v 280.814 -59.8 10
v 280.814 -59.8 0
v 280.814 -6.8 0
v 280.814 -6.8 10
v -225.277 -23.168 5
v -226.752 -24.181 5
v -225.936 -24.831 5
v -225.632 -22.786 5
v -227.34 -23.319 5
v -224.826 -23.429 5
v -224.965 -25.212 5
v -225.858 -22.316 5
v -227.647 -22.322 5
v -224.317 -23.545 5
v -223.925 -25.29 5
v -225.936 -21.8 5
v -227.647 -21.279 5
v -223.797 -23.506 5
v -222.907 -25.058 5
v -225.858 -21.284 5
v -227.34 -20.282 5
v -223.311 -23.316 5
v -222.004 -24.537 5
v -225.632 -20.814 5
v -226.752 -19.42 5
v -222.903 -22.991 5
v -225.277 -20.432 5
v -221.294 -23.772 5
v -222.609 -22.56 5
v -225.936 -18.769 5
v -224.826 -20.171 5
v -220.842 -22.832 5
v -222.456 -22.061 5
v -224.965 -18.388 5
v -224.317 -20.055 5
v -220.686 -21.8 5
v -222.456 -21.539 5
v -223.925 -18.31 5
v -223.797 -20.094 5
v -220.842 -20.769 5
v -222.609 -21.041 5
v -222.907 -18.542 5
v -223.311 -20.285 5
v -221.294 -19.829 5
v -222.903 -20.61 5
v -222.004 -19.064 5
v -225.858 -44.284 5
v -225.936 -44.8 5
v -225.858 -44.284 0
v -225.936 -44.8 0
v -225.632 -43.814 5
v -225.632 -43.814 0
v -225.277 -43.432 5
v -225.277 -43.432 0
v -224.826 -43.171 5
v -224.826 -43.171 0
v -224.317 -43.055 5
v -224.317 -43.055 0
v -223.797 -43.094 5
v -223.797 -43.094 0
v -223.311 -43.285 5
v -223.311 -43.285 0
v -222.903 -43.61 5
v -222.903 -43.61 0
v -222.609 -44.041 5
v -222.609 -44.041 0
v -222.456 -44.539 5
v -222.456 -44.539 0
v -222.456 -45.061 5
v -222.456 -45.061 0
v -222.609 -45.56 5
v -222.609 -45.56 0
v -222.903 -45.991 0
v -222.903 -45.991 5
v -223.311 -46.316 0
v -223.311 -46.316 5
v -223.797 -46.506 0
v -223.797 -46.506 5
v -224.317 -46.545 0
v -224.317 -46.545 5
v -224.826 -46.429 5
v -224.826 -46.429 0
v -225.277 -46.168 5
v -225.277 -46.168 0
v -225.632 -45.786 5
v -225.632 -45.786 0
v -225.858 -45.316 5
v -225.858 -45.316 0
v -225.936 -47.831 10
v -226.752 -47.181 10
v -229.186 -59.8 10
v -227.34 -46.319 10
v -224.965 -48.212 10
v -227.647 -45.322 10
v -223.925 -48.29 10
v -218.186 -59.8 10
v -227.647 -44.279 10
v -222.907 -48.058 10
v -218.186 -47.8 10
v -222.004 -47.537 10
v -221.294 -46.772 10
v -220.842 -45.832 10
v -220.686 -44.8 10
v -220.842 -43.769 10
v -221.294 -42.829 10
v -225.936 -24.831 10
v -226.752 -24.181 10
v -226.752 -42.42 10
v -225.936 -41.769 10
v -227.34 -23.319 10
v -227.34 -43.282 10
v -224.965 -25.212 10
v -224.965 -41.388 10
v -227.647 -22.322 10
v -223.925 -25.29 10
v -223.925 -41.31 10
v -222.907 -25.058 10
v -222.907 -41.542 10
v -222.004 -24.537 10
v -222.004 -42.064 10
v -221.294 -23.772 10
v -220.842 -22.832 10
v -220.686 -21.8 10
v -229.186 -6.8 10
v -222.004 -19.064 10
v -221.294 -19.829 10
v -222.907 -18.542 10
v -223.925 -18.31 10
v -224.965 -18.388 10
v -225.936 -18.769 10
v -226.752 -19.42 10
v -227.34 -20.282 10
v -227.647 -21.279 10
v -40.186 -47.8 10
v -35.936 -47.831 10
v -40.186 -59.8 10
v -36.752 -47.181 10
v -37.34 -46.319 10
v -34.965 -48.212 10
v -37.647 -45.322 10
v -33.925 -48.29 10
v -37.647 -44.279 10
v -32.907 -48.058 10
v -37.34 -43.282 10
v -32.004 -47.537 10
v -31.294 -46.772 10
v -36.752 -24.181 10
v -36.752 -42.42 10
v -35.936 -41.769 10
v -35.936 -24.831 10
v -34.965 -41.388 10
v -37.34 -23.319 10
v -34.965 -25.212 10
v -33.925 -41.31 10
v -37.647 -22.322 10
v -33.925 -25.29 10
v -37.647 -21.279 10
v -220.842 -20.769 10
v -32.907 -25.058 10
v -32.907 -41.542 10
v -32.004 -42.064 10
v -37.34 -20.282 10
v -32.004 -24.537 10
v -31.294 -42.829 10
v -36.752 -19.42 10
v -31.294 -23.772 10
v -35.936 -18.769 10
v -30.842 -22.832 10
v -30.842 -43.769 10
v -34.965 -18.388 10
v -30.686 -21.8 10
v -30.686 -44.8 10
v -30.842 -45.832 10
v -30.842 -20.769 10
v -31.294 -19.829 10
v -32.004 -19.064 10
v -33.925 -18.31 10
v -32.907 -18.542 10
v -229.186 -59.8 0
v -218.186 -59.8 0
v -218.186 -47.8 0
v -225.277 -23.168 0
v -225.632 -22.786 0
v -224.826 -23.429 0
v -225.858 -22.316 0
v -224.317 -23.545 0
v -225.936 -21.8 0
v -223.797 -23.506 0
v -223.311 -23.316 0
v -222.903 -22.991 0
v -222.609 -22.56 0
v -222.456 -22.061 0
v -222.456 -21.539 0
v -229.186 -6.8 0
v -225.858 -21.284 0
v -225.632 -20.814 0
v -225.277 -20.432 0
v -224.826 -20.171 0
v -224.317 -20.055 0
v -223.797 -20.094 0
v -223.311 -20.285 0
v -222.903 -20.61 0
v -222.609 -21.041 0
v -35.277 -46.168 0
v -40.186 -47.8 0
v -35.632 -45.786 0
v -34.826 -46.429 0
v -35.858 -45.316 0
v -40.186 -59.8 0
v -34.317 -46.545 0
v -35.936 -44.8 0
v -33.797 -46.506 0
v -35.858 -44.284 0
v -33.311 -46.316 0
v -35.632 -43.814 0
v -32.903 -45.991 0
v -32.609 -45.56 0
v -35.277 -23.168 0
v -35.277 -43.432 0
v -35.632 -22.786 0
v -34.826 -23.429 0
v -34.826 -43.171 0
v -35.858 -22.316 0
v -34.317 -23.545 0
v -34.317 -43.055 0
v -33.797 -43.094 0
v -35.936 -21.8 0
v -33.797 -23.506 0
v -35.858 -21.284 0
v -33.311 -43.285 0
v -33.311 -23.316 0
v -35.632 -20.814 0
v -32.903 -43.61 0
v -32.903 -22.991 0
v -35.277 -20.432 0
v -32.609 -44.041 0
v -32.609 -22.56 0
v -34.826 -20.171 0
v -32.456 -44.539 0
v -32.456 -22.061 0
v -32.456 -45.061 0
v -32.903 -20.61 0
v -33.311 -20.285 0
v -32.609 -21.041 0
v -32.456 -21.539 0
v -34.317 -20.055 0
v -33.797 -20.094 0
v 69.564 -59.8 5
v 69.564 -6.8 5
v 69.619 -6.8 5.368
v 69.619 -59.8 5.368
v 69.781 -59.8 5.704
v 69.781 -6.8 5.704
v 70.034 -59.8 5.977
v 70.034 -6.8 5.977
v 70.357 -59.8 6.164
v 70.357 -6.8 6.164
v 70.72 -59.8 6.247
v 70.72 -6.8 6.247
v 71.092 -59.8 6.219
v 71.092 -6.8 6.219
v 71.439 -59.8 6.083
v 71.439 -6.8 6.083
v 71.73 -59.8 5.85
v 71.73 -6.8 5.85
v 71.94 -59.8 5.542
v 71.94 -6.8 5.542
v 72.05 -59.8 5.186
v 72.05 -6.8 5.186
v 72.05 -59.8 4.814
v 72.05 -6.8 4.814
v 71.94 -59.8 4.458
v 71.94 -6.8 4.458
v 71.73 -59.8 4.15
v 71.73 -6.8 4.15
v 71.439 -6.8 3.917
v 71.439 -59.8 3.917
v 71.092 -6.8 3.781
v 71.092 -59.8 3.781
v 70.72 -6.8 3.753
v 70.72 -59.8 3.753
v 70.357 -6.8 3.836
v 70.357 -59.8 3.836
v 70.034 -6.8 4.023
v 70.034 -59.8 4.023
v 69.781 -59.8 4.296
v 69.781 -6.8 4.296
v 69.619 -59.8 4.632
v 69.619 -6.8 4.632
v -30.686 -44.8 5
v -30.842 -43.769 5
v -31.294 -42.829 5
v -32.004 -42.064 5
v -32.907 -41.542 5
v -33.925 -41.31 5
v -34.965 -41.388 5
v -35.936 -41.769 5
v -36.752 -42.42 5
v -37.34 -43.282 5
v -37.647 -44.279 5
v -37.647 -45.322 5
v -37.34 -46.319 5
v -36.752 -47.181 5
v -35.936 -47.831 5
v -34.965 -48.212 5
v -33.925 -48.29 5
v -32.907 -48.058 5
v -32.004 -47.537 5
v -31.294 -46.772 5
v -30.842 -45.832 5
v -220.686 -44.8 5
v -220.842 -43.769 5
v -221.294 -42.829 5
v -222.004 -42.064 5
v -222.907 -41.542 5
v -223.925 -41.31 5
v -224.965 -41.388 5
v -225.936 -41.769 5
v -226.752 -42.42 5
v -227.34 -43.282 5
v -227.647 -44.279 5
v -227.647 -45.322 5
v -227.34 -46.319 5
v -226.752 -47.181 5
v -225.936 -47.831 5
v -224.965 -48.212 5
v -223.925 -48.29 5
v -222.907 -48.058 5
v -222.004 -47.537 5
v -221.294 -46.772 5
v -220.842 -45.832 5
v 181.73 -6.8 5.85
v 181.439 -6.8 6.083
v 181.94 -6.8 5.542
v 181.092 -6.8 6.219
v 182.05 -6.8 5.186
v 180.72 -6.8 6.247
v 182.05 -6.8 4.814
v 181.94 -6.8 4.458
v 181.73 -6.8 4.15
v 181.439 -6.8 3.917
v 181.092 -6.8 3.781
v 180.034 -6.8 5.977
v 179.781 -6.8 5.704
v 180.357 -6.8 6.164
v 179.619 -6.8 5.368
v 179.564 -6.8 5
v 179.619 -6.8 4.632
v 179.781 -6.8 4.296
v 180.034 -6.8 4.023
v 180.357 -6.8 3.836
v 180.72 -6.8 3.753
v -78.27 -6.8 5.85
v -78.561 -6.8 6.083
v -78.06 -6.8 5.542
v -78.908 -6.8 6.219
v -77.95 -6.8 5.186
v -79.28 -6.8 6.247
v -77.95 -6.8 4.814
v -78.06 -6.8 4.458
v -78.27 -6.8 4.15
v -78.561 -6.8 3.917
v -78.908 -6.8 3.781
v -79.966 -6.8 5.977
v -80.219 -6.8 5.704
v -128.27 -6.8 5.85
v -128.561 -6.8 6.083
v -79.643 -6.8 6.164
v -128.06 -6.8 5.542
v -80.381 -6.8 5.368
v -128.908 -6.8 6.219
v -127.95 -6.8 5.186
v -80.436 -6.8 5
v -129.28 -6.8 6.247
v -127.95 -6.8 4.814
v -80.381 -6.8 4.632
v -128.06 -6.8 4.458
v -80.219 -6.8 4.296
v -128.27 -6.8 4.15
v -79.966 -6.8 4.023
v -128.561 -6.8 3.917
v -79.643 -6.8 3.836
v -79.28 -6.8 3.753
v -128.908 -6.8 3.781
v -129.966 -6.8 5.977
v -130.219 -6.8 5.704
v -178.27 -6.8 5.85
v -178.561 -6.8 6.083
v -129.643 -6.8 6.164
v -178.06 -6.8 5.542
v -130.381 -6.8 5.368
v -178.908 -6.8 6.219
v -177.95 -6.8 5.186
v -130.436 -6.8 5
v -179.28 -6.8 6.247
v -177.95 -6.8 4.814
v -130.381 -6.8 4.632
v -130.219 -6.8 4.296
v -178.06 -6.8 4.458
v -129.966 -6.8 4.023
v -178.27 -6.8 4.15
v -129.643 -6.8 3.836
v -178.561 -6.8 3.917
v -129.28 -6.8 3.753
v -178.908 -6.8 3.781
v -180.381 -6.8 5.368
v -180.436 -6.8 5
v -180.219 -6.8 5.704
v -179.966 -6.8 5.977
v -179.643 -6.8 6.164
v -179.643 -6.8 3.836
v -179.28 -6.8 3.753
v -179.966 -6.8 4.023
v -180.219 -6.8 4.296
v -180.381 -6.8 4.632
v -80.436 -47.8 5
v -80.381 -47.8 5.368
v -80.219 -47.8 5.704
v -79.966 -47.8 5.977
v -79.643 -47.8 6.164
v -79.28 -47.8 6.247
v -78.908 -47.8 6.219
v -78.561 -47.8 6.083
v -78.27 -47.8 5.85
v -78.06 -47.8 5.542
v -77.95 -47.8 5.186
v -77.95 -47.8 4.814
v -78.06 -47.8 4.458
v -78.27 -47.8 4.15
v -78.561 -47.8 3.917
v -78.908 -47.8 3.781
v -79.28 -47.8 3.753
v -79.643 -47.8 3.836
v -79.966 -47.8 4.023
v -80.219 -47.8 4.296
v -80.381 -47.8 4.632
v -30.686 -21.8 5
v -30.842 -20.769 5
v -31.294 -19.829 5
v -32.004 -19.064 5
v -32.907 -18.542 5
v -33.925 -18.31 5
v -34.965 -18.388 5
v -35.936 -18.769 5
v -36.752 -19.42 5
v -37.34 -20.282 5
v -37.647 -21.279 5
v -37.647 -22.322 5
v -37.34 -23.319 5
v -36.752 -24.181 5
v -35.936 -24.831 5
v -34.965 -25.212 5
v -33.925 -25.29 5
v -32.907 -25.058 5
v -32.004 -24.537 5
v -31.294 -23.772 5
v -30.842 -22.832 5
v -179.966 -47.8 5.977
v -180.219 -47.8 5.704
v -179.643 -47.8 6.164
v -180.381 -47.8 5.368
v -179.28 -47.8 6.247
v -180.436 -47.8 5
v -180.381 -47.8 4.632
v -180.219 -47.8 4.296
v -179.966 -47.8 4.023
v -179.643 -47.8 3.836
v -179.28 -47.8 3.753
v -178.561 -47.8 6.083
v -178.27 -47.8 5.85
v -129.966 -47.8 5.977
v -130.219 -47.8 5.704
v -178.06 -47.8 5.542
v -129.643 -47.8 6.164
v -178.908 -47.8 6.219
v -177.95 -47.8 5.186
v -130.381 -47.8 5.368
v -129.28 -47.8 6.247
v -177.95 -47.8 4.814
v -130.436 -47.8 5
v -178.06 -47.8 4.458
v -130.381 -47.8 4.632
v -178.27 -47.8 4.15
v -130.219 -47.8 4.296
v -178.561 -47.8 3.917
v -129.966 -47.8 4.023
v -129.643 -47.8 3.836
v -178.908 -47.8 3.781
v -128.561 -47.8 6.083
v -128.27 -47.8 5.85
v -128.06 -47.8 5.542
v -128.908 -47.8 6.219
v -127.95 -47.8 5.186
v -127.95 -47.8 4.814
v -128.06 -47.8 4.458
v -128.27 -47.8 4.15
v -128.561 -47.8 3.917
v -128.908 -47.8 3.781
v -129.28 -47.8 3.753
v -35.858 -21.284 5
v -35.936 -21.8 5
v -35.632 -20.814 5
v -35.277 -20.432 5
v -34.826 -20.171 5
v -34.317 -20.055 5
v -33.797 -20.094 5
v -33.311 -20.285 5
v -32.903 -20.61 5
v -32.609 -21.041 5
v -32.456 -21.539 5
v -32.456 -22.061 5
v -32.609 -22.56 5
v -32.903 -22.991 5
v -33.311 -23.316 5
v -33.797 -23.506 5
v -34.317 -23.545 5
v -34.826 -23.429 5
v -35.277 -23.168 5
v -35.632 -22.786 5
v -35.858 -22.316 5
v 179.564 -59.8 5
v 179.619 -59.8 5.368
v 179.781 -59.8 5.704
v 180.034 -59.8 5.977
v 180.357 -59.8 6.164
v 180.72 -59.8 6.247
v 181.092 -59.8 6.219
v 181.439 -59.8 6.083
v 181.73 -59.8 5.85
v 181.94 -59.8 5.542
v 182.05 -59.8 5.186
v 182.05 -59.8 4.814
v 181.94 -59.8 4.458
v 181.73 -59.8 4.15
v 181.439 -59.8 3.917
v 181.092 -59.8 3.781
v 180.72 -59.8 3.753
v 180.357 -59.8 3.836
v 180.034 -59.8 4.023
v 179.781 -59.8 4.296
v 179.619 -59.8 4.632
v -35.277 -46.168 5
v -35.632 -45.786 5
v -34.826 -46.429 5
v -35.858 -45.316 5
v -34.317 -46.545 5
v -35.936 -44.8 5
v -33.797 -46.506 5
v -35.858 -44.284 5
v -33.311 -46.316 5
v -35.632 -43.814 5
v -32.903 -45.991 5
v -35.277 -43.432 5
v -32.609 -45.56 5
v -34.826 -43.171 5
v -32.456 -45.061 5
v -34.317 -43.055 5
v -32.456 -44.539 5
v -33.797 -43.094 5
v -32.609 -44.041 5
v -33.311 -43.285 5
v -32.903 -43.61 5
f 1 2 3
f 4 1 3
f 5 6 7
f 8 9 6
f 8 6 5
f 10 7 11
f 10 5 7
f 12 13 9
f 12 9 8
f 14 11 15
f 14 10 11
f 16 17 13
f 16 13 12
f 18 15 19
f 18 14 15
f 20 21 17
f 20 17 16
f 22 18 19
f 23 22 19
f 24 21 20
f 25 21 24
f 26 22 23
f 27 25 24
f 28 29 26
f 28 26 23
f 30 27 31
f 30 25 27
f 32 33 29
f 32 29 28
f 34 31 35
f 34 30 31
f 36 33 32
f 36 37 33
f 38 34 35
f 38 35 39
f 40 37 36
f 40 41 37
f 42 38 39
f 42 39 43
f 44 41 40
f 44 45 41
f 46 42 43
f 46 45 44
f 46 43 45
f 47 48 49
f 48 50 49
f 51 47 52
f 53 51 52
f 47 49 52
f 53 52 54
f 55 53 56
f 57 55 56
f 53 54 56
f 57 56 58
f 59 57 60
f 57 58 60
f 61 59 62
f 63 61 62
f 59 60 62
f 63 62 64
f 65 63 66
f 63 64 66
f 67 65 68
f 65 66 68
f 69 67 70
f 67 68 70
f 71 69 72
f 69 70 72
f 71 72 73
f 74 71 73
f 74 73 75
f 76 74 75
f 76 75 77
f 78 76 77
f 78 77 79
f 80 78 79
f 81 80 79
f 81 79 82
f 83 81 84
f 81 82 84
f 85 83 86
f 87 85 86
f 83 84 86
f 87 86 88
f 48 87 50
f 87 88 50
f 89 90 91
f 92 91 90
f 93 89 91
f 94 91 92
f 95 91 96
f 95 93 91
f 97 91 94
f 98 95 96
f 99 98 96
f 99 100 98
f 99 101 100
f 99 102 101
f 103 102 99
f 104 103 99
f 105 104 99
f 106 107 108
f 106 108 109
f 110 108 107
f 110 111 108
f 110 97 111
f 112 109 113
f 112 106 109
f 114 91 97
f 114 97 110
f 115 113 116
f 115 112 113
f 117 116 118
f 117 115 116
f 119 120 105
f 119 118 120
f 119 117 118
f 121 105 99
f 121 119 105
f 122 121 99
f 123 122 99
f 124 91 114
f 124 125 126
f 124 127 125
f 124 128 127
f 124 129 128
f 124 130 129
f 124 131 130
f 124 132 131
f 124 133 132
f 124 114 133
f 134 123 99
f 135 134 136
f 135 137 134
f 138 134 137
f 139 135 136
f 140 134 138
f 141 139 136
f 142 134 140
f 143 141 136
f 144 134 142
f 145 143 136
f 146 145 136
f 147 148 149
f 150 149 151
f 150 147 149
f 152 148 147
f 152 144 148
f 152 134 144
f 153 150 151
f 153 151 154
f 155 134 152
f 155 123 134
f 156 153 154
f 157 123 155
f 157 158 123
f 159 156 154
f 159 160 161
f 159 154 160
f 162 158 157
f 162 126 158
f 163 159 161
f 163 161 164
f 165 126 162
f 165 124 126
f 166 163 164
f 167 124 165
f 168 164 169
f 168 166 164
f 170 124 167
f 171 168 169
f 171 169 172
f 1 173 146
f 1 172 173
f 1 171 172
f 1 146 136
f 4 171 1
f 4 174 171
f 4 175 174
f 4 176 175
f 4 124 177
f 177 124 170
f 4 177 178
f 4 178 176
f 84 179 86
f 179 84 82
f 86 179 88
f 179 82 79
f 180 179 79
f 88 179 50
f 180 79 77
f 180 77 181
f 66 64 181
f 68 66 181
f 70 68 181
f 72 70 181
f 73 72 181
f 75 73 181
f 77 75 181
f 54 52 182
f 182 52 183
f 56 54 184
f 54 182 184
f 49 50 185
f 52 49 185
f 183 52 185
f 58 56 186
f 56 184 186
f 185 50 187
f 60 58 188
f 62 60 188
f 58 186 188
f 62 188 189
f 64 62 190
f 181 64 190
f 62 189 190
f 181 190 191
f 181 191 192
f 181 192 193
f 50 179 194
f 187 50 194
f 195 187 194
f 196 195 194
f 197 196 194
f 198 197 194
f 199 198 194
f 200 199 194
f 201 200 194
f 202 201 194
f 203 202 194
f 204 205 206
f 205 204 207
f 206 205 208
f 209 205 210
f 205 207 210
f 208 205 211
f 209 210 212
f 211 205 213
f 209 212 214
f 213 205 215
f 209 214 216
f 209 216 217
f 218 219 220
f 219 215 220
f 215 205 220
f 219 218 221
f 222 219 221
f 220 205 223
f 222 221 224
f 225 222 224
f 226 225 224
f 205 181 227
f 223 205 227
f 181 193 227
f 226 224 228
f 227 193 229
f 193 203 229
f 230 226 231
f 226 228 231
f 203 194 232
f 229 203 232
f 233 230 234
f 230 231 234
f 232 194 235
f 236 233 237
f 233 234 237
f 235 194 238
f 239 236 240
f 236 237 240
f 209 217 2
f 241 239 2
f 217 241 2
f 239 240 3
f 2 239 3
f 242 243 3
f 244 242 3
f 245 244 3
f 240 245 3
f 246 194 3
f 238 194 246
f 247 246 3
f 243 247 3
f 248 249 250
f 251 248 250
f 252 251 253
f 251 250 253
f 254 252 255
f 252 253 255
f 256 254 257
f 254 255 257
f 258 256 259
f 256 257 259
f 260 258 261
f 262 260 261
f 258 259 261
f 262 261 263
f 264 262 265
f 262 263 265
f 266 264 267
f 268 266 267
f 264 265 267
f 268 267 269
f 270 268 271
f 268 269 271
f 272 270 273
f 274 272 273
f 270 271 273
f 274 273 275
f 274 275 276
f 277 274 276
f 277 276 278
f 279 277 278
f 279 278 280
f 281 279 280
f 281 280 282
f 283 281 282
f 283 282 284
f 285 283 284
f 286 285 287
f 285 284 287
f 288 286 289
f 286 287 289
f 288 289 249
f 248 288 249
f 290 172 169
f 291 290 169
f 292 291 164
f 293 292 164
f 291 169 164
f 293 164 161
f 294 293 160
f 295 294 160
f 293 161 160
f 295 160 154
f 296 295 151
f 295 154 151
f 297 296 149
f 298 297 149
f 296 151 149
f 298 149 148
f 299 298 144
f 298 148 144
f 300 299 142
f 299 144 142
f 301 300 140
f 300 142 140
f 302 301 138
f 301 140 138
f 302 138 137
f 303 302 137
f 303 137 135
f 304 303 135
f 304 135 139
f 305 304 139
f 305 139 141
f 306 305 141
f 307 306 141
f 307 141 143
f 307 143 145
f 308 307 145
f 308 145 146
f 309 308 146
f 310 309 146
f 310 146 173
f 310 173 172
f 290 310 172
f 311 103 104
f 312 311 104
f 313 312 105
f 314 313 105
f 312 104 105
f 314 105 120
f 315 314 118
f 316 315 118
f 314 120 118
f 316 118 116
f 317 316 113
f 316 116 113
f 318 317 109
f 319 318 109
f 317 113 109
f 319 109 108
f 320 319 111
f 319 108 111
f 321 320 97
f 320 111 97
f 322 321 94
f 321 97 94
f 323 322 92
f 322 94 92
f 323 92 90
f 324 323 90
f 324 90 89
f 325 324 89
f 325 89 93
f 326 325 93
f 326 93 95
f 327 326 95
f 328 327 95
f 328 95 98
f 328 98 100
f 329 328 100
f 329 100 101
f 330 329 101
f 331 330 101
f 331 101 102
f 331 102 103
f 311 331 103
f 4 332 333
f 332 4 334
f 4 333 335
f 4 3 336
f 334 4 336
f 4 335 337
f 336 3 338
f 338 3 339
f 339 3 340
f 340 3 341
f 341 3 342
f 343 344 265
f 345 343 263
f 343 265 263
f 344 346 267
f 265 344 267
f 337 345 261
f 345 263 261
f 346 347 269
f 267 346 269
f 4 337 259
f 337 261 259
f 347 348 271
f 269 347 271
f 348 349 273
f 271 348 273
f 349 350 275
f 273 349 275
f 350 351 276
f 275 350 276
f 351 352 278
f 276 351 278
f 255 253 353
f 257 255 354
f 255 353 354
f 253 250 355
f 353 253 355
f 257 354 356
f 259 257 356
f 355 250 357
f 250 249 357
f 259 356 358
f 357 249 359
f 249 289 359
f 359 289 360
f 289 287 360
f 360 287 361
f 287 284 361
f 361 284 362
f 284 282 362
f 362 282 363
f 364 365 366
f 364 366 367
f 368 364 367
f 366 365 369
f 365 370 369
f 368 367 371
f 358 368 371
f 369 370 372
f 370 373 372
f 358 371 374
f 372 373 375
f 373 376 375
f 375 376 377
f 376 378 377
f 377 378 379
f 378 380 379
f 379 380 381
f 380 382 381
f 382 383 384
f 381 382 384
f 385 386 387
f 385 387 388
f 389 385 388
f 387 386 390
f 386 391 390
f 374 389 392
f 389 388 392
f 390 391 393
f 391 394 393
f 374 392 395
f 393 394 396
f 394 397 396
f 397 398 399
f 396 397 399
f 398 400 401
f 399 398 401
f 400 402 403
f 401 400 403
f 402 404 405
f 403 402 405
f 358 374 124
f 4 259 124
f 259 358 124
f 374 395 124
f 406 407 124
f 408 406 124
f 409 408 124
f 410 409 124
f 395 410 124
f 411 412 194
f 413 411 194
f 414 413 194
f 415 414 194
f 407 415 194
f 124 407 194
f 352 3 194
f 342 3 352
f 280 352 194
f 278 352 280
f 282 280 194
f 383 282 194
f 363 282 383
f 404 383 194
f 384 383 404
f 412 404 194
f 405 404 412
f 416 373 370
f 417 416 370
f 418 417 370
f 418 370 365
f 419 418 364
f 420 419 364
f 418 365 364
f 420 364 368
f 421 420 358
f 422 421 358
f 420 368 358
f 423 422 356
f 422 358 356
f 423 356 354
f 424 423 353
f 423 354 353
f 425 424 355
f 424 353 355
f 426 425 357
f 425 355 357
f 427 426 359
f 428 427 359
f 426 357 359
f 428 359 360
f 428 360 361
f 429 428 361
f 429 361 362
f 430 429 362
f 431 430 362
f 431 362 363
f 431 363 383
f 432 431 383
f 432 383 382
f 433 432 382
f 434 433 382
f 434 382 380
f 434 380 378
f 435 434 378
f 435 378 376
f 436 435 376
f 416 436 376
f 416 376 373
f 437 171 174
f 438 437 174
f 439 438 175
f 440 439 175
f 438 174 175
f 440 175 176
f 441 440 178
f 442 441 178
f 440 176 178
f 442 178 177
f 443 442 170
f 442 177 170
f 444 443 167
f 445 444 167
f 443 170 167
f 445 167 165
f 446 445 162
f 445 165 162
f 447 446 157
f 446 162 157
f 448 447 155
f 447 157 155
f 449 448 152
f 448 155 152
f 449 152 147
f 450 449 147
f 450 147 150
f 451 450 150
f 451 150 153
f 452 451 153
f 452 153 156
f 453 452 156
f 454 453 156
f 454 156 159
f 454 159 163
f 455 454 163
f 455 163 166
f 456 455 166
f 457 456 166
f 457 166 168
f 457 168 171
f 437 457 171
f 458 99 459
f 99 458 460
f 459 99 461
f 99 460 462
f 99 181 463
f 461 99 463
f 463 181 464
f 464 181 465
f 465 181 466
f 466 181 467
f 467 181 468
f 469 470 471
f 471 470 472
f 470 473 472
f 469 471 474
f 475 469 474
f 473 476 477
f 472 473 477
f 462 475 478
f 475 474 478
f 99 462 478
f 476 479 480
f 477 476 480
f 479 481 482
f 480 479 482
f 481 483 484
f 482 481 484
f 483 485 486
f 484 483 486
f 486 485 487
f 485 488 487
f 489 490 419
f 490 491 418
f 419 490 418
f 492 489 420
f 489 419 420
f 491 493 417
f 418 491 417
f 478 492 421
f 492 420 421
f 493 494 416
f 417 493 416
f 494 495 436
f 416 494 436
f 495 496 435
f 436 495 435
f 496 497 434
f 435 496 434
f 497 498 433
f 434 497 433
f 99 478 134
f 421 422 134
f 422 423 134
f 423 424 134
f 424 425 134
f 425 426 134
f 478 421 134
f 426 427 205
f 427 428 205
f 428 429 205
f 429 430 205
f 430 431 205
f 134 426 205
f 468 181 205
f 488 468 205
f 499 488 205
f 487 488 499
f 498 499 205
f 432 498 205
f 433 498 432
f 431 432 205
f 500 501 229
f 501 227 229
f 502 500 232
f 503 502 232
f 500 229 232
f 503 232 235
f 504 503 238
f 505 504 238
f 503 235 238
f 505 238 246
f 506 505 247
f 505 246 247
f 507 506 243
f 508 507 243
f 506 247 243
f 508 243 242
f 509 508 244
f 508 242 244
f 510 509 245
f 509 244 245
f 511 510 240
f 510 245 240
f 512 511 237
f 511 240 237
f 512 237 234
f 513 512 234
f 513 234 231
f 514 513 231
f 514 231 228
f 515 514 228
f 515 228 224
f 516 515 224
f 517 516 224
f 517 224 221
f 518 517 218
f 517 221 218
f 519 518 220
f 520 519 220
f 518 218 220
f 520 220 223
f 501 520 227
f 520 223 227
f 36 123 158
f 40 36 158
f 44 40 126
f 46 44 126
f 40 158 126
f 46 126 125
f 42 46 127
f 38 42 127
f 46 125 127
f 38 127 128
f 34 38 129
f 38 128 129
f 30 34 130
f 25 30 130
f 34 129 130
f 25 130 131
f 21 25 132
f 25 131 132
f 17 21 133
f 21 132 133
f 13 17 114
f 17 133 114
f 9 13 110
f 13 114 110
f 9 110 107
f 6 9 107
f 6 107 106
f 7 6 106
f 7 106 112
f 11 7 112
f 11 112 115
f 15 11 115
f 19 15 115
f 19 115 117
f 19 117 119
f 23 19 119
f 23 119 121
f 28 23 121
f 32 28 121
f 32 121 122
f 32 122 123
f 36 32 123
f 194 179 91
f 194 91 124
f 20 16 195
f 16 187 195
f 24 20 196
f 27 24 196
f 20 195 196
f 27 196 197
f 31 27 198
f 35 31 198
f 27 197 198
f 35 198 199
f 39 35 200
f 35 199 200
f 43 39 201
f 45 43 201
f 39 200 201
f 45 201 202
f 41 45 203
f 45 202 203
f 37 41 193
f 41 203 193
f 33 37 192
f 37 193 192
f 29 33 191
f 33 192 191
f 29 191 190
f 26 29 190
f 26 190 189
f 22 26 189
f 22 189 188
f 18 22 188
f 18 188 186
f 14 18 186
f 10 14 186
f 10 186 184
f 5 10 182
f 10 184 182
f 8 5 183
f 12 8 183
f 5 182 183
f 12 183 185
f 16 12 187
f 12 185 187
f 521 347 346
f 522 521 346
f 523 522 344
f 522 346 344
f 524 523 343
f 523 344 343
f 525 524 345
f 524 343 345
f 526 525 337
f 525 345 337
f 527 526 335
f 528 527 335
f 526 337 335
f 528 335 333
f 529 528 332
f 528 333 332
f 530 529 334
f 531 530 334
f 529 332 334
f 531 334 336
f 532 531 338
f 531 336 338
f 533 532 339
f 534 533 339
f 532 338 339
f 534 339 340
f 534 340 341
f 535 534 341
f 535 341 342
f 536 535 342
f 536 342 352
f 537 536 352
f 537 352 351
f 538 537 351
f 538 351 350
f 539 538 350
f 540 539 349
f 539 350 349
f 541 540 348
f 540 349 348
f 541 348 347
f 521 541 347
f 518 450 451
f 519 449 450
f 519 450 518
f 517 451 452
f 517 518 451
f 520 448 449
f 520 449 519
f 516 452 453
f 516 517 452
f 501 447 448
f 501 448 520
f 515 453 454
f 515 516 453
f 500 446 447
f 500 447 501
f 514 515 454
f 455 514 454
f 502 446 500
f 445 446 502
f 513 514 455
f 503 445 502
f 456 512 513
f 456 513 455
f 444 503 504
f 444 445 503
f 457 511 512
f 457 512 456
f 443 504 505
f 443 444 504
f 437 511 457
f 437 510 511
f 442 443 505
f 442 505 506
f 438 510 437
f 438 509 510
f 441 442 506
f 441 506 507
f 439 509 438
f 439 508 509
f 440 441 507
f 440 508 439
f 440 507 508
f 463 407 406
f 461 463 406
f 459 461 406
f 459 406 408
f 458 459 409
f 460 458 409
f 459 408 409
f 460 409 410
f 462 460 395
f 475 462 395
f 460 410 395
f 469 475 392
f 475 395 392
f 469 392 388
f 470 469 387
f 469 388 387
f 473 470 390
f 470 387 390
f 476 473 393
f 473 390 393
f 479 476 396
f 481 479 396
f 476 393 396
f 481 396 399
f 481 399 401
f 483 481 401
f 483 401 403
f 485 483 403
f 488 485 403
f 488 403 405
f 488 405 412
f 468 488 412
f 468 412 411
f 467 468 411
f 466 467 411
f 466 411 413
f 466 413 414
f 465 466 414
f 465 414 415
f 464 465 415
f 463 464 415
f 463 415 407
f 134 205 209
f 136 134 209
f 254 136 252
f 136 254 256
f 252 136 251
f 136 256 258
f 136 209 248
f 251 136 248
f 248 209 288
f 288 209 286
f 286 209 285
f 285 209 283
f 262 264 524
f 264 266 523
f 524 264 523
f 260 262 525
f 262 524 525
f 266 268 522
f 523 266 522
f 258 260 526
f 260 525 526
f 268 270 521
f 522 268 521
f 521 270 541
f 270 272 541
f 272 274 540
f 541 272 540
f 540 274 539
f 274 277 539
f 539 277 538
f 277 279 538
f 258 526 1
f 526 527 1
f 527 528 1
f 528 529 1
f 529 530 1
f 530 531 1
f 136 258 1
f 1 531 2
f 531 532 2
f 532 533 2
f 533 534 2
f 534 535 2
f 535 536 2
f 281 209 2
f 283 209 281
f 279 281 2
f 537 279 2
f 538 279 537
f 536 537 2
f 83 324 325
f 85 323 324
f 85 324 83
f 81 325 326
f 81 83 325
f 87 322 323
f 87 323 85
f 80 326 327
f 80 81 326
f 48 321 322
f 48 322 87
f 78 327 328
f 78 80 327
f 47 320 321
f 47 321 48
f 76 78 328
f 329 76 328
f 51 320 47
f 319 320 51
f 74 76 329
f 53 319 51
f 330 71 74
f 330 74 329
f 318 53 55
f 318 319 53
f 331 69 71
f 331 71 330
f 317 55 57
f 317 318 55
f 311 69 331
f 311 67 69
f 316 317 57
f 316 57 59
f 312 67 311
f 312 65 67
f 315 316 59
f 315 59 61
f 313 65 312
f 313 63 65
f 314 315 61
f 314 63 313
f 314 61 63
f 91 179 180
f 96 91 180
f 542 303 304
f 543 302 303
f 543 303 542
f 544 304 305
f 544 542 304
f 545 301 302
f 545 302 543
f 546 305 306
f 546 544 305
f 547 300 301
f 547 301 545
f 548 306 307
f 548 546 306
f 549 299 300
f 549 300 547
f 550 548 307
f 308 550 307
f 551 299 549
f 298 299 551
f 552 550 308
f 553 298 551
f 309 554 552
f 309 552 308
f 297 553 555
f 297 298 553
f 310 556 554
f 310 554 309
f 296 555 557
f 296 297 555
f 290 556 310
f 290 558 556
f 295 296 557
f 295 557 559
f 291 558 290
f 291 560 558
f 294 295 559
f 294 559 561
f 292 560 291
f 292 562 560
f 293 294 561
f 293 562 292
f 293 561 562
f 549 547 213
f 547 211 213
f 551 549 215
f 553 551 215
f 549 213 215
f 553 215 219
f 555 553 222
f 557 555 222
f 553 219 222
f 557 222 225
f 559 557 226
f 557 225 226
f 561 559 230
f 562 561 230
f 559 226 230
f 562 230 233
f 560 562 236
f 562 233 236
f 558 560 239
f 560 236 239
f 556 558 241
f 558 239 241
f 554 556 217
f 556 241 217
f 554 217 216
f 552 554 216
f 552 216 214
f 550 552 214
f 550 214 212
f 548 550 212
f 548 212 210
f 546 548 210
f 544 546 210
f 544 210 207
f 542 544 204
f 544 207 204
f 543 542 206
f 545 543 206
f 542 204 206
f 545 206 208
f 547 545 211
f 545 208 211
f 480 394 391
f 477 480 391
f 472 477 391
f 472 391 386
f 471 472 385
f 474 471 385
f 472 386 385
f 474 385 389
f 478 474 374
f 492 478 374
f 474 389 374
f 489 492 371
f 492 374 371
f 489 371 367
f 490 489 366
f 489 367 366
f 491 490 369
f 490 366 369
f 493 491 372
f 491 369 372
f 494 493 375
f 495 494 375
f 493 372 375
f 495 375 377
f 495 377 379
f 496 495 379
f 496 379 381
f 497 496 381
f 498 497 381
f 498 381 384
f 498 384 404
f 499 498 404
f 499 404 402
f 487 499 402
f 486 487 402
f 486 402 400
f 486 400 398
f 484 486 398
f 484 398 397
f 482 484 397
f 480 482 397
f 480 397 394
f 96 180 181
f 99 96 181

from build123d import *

# Parameters (mm, degrees)
F0_W           = 10
F0_H           = 53
F0_W_2         = 310
F1_DEPTH       = 10
F3_D           = 3.5
F3_CBORE_D     = 7
F3_CBORE_DEPTH = 5
F4_R           = 1.25
F5_DEPTH       = 53


with BuildPart() as f1:
    # F0 (on Top) → F1 (new body)
    with BuildSketch(Plane.XY):
        with Locations((-224.1861552, -33.3002303571)):
            Rectangle(F0_W, F0_H)
        Polygon((-39.1861552, -6.8002303571), (-219.1861552, -6.8002303571), (-219.1861552, -59.8002303571), (-218.1861552, -59.8002303571), (-218.1861552, -47.8002303571), (-40.1861552, -47.8002303571), (-40.1861552, -59.8002303571), (-39.1861552, -59.8002303571), align=None)
        with Locations((-34.1861552, -33.3002303571)):
            Rectangle(F0_W, F0_H)
        with Locations((125.8138448, -33.3002303571)):
            Rectangle(F0_W_2, F0_H)
    extrude(amount=F1_DEPTH)

    # F3 (through all)
    with Locations(Plane.XY.offset(10)):
        with Locations((-224.1861552, -21.8002303571), (-224.1861552, -44.8002303571), (-34.1861620545, -21.8002303571), (-34.1861620545, -44.8002303571)):
            CounterBoreHole(F3_D / 2, F3_CBORE_D / 2, F3_CBORE_DEPTH)

    # F4 (on face) → F5 (cut, through all)
    with BuildSketch(Plane(origin=(0, -6.8002303571, 0), x_dir=(-1, 0, 0), z_dir=(0, 1, 0))):
        with Locations((-180.8138448, 5)):
            Circle(F4_R)
        with Locations((-70.8138448, 5)):
            Circle(F4_R)
        with Locations((79.1861552, 5)):
            Circle(F4_R)
        with Locations((129.1861552, 5)):
            Circle(F4_R)
        with Locations((179.1861552, 5)):
            Circle(F4_R)
    extrude(amount=-F5_DEPTH, mode=Mode.SUBTRACT)


solid = f1.part
